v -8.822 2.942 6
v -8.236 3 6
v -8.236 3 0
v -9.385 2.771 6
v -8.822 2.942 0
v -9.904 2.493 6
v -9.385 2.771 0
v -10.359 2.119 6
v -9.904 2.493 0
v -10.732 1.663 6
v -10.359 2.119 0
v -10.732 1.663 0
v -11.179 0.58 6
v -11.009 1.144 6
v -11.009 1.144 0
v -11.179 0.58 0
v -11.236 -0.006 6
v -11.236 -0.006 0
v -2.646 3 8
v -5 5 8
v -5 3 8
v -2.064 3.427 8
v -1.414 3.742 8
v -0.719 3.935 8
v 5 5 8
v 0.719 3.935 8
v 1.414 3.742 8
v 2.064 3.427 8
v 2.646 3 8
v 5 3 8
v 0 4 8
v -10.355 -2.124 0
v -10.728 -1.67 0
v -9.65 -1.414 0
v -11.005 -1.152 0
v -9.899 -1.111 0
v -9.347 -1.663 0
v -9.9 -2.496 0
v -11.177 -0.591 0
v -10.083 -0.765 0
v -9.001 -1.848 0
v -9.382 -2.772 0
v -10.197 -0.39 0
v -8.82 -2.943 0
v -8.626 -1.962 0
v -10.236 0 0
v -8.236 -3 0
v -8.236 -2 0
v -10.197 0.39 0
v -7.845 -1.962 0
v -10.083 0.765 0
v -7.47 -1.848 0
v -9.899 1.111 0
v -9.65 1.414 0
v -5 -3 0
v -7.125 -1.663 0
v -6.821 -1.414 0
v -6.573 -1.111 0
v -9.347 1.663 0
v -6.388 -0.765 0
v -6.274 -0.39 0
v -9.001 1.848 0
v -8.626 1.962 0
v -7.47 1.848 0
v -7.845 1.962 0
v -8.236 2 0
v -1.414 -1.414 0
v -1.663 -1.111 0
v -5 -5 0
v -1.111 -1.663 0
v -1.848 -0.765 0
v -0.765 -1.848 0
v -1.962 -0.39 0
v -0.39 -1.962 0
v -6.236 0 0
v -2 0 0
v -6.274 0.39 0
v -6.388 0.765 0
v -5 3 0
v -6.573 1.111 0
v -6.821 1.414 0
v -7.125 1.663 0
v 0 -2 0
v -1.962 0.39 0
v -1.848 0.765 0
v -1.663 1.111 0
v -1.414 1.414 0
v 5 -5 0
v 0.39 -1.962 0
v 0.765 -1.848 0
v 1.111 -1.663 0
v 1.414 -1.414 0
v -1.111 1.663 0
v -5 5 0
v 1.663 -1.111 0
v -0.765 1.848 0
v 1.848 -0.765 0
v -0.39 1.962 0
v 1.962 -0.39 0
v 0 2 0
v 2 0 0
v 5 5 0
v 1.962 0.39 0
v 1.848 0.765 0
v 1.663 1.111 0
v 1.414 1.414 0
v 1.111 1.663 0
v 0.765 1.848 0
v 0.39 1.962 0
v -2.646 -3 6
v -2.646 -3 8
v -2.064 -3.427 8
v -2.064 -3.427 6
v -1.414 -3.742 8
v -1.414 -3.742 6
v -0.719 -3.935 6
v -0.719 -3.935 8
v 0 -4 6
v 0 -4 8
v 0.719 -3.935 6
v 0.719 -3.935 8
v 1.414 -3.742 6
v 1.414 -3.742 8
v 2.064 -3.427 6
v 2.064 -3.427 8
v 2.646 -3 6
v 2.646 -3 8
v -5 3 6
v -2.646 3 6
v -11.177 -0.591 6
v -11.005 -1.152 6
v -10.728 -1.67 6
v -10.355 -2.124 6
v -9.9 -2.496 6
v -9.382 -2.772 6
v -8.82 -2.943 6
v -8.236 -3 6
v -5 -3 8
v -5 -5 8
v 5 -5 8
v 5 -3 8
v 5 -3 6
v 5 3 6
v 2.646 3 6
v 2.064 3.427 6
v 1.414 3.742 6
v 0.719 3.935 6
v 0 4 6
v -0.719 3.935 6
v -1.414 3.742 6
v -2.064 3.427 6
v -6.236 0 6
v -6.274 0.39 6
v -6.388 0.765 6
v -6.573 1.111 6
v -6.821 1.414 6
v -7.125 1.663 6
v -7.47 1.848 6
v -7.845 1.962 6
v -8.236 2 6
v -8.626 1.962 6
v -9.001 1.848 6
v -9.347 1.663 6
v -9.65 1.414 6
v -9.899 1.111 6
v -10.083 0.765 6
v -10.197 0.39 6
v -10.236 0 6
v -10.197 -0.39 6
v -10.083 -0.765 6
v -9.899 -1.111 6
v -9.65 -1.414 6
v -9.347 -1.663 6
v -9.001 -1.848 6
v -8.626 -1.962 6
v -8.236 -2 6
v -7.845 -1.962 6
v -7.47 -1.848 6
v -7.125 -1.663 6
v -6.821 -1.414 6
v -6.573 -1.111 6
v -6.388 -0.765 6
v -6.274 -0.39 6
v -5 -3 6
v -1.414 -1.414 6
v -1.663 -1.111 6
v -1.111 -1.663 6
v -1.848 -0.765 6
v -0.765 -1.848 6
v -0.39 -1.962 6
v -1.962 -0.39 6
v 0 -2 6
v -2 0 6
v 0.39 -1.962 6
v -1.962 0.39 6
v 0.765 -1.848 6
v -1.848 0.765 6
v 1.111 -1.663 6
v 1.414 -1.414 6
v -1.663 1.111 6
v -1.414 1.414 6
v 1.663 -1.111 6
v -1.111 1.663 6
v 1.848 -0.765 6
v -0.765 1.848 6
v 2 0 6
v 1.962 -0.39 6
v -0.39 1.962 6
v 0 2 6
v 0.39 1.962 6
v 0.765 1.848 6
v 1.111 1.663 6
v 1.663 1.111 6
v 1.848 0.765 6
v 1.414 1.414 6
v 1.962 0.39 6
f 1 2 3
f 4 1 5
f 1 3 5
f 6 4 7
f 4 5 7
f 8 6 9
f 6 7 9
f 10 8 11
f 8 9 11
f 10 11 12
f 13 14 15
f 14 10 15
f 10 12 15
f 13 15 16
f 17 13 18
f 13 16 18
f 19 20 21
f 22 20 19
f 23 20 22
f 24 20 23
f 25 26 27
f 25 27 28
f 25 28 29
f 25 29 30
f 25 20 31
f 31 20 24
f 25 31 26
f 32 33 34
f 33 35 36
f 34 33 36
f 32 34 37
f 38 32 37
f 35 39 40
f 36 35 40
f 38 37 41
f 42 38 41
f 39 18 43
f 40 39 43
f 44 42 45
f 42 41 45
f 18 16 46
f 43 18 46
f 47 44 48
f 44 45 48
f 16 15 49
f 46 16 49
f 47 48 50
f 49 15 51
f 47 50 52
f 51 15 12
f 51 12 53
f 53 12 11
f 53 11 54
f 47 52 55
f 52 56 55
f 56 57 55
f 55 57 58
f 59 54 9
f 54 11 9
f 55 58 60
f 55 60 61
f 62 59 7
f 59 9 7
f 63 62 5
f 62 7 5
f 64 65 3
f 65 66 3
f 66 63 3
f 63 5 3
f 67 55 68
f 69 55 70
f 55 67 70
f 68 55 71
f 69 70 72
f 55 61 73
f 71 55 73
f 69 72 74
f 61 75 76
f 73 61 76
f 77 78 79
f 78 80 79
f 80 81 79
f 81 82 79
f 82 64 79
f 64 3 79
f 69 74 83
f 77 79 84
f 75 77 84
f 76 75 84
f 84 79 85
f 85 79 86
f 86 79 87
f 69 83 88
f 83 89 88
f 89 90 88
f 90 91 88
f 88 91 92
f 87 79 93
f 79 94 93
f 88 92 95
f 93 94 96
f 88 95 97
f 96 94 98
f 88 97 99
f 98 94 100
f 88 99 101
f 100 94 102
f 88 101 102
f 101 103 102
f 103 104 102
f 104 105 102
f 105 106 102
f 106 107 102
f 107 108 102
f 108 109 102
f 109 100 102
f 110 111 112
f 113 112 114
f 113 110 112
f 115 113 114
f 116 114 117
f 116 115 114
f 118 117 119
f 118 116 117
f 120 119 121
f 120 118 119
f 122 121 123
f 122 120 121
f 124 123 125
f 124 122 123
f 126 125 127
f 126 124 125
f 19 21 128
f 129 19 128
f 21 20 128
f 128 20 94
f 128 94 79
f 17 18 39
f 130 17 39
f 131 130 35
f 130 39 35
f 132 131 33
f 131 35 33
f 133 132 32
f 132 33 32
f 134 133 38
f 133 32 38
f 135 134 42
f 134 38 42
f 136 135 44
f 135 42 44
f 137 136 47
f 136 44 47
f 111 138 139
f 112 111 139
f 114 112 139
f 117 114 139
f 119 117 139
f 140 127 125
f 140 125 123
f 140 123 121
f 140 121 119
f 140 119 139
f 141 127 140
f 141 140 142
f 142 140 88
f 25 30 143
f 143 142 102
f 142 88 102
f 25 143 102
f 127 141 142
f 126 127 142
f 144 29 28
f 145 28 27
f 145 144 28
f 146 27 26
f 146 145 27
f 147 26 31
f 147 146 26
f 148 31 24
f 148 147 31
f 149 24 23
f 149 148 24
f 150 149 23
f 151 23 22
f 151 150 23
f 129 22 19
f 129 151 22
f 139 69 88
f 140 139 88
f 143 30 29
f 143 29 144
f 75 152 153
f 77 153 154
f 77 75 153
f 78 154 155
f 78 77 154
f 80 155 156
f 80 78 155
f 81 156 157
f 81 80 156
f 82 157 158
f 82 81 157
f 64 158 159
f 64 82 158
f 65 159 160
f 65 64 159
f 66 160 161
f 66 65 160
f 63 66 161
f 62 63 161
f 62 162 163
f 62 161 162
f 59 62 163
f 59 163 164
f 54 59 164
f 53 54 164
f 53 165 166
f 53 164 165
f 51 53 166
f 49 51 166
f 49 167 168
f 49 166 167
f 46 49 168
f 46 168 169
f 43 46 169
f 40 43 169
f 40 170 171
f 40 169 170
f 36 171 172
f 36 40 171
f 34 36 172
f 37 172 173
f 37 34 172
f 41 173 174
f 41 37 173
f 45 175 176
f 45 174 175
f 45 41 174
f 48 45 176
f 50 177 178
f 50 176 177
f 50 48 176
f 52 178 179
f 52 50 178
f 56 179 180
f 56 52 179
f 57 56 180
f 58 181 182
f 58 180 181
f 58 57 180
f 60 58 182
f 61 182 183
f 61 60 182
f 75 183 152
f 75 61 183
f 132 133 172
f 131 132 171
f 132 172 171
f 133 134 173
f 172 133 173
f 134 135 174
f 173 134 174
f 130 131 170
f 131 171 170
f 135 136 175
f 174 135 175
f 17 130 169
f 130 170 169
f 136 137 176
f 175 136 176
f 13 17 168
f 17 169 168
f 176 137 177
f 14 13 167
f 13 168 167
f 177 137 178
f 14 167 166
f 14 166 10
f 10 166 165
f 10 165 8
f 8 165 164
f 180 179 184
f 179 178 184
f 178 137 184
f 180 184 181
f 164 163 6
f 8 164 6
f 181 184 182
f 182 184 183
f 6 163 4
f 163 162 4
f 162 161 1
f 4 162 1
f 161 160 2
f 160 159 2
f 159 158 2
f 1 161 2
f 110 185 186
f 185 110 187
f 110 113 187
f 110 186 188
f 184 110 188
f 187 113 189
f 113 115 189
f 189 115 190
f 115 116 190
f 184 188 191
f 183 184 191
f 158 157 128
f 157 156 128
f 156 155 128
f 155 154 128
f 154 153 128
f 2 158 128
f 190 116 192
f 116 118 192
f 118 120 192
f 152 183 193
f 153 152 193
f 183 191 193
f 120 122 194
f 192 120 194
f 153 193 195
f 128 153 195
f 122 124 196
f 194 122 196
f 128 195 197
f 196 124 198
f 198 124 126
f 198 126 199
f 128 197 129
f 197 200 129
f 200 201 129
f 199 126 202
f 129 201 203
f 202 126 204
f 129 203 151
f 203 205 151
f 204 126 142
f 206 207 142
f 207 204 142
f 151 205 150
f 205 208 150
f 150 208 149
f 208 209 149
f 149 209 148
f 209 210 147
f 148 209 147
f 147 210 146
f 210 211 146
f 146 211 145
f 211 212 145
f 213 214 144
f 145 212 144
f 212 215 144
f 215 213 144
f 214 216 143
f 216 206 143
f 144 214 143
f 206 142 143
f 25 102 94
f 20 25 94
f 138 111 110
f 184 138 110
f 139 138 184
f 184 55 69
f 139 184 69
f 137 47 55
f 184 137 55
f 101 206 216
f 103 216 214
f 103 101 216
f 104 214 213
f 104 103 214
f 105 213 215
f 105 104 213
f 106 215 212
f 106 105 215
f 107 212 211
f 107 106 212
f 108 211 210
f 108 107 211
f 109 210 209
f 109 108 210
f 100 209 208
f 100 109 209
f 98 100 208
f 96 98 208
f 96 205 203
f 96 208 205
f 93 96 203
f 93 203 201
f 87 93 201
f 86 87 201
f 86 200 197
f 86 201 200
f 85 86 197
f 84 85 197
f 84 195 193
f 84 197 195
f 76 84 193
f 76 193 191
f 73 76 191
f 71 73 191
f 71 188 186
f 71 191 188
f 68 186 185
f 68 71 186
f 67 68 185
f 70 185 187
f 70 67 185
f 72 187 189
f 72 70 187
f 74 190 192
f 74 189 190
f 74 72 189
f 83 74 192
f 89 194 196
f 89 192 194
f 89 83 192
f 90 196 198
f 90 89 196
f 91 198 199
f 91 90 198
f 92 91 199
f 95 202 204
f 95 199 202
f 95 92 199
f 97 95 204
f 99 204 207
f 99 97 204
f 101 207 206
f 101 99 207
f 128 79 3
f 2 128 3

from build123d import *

# Parameters (mm, degrees)
SKETCH1_R           = 2
BOSS_EXTRUDE1_DEPTH = 8
SKETCH2_W           = 2
SKETCH2_H           = 6
CUT_EXTRUDE1_DEPTH  = 18
SKETCH3_R           = 4
CUT_EXTRUDE2_DEPTH  = 36


with BuildPart() as part:
    # Sketch1 → Boss-Extrude1 (new body)
    with BuildSketch(Plane.XY):
        with BuildLine():
            Line((-5, 3), (-8.235644223, 3))
            ThreePointArc((-8.235644223, 3), (-10.359234513, 2.119047966), (-11.235637346, -0.006423812))
            ThreePointArc((-11.235637346, -0.006423812), (-10.354692189, -2.12359029), (-8.235644223, -3))
            Line((-8.235644223, -3), (-5, -3))
            Line((-5, -3), (-5, -5))
            Line((-5, -5), (5, -5))
            Line((5, -5), (5, 5))
            Line((5, 5), (-5, 5))
            Line((-5, 5), (-5, 3))
        make_face()
        with Locations((-8.235644223, 0)):
            Circle(SKETCH1_R, mode=Mode.SUBTRACT)
        Circle(SKETCH1_R, mode=Mode.SUBTRACT)
    extrude(amount=BOSS_EXTRUDE1_DEPTH)

    # Sketch2 → Cut-Extrude1 (cut, symmetric)
    with BuildSketch(Plane(origin=(0, 0, 0), x_dir=(0, 0, -1), z_dir=(1, 0, 0))):
        with Locations((-7, 0)):
            Rectangle(SKETCH2_W, SKETCH2_H)
    extrude(amount=CUT_EXTRUDE1_DEPTH, both=True, mode=Mode.SUBTRACT)

    # Sketch3 → Cut-Extrude2 (cut)
    with BuildSketch(Plane.XY.offset(6)):
        Circle(SKETCH3_R)
    extrude(amount=CUT_EXTRUDE2_DEPTH, mode=Mode.SUBTRACT)


solid = part.part
